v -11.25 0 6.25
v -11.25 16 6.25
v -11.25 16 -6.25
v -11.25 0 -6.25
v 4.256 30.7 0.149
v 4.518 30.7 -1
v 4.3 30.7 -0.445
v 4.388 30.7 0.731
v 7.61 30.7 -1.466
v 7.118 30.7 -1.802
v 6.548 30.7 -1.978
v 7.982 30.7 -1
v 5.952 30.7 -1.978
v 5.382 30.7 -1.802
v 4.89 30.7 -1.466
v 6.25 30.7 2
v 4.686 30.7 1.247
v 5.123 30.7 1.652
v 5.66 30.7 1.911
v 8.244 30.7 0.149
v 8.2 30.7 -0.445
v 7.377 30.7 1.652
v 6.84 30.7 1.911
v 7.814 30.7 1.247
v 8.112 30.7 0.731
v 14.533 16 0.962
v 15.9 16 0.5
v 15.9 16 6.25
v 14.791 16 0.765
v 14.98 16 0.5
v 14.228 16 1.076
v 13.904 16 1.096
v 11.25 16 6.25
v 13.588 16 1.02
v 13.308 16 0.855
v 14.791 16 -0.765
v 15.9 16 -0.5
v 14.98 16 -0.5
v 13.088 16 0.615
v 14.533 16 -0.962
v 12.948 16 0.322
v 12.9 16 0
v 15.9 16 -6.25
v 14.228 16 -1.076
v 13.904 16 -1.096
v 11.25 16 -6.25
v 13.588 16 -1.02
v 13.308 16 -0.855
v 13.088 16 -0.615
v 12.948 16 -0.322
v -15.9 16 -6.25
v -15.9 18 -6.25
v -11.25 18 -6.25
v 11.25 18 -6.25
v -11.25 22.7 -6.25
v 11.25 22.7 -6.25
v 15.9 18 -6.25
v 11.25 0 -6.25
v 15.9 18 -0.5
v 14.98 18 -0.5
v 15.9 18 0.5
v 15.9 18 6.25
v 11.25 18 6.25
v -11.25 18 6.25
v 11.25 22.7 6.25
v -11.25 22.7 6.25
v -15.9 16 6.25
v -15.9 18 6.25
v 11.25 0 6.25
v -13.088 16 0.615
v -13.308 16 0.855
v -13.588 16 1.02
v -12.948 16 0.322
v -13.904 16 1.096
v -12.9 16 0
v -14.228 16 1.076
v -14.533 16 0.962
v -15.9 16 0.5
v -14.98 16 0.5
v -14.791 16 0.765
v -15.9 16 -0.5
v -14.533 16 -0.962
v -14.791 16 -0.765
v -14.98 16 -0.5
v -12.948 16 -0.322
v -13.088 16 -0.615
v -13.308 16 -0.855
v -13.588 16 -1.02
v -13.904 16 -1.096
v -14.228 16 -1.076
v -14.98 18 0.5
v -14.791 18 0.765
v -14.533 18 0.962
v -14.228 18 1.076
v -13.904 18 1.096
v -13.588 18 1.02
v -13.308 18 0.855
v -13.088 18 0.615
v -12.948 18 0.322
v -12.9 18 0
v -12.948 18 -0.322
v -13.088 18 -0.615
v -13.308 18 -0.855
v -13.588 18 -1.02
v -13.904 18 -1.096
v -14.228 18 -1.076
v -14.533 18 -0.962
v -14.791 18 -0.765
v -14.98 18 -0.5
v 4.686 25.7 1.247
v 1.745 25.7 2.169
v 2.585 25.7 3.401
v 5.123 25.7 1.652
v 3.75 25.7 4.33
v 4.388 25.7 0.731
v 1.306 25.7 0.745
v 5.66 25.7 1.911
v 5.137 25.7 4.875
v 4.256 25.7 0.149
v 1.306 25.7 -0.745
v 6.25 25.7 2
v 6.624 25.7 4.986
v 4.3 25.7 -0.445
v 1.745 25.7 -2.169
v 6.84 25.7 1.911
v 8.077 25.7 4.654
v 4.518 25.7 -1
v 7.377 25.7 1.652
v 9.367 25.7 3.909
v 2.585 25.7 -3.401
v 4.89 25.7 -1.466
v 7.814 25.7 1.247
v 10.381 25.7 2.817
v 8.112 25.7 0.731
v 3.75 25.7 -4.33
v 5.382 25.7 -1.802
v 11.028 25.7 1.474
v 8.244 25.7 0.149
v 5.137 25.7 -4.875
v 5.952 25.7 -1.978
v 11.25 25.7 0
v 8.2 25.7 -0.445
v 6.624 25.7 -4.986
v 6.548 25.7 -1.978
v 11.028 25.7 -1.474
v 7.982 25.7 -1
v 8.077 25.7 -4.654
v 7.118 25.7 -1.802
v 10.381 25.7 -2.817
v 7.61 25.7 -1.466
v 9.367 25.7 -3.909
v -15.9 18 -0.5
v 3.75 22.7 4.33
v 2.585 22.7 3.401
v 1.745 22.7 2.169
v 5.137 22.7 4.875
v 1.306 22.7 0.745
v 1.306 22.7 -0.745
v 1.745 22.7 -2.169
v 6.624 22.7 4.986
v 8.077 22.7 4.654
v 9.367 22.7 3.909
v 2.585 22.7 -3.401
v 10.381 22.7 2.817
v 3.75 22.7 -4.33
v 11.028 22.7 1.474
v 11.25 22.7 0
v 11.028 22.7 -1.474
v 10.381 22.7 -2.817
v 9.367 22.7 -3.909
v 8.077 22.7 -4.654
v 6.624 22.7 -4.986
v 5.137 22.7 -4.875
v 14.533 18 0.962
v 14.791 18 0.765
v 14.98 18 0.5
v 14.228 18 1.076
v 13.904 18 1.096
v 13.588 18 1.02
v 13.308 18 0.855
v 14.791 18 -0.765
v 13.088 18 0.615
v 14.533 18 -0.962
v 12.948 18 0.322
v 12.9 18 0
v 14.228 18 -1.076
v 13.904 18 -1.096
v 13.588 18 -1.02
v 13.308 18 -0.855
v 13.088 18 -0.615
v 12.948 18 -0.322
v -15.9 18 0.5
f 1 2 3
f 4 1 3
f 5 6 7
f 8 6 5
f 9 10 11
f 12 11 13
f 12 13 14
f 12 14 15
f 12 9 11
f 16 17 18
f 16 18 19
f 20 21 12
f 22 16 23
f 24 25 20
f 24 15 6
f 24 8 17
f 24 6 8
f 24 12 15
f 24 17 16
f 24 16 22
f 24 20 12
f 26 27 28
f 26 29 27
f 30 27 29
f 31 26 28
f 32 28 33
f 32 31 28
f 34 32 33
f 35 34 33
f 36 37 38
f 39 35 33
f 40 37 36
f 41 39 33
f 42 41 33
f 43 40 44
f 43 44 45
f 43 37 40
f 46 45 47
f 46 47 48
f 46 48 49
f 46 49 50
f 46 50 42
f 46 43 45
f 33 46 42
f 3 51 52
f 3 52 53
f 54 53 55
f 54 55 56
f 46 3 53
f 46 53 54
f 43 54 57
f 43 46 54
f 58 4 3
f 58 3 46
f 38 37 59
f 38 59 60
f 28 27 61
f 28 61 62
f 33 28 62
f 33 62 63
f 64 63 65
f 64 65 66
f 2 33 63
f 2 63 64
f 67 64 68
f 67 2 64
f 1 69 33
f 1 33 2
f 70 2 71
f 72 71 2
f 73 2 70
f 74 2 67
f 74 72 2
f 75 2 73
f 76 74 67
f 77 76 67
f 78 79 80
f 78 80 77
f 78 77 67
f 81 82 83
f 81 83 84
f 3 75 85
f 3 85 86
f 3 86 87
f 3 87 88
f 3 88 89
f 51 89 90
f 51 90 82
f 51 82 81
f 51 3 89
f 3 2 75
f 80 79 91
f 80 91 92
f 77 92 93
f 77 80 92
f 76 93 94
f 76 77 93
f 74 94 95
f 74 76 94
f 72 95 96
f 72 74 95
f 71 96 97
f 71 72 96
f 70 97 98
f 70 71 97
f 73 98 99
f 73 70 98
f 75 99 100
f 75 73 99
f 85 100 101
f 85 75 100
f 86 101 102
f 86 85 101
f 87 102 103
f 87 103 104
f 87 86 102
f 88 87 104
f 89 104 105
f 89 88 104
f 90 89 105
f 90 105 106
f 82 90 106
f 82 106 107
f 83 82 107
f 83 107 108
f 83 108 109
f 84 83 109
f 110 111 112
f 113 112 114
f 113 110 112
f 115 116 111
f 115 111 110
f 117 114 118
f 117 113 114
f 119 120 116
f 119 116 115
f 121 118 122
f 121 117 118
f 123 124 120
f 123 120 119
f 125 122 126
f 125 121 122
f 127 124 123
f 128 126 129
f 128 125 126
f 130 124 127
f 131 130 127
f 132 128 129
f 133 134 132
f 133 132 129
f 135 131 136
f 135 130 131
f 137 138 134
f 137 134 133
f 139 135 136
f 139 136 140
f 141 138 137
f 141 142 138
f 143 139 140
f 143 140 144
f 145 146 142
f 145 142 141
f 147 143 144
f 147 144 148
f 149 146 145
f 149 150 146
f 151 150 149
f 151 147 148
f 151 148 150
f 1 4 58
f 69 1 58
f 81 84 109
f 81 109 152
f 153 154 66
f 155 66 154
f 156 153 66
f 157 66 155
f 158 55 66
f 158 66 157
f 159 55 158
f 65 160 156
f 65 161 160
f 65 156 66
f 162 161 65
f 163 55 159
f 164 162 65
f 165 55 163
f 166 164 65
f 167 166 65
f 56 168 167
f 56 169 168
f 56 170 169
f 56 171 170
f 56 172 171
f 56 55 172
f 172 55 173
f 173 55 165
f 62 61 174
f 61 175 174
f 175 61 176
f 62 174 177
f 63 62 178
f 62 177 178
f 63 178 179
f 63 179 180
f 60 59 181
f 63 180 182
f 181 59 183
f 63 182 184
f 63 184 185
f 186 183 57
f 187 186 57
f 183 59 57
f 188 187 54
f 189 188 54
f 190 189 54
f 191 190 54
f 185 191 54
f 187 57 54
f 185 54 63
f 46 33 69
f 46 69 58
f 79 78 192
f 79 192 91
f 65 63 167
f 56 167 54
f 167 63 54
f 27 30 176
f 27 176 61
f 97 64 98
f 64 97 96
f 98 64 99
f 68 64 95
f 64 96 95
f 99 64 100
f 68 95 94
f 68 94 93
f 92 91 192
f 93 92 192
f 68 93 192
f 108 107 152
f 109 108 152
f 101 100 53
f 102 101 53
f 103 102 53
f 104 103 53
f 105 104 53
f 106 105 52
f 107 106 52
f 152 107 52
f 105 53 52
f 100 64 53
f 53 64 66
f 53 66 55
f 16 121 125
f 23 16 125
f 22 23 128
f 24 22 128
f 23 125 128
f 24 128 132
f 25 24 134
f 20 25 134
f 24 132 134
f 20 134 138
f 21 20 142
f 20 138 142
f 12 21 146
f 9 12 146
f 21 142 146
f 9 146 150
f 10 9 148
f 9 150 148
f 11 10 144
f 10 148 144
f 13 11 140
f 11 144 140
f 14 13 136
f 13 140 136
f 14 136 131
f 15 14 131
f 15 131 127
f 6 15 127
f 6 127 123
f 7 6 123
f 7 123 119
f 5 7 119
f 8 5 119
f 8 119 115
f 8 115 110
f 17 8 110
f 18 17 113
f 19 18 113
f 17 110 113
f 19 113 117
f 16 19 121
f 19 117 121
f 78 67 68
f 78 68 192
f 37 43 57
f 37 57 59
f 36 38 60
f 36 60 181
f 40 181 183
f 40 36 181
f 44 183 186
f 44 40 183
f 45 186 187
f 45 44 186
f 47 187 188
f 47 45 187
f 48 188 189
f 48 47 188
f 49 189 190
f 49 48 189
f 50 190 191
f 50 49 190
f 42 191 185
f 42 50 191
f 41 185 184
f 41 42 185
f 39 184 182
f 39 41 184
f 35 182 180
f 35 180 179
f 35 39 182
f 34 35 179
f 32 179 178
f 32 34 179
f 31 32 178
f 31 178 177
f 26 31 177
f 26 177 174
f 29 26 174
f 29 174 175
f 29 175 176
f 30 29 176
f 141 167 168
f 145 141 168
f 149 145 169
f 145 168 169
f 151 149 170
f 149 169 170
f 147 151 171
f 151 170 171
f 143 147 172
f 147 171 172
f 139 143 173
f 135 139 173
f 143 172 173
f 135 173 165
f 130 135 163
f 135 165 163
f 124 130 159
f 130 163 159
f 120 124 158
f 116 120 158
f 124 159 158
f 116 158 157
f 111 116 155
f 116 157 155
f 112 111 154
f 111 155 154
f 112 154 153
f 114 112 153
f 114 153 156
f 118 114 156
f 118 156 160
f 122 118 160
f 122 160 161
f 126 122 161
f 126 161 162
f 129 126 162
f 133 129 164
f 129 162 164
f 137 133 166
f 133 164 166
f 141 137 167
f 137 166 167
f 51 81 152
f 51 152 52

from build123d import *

# Parameters (mm, degrees)
SKETCH_1_W      = 22.5
SKETCH_1_H      = 12.5
EXTRUDE_1_DEPTH = 16
EXTRUDE_2_DEPTH = 2
SKETCH_3_W      = 22.5
SKETCH_3_H      = 12.5
EXTRUDE_3_DEPTH = 4.7
SKETCH_4_R      = 5
EXTRUDE_4_DEPTH = 3
SKETCH_5_R      = 2
EXTRUDE_5_DEPTH = 5


with BuildPart() as part:
    # 草图1 → 凸台-拉伸1 (new body)
    with BuildSketch(Plane(origin=(0, 0, 0), x_dir=(1, 0, 0), z_dir=(0, 1, 0))):
        Rectangle(SKETCH_1_W, SKETCH_1_H)
    extrude(amount=EXTRUDE_1_DEPTH)

    # 草图2 → 凸台-拉伸2 (add)
    with BuildSketch(Plane(origin=(0, 16, 0), x_dir=(1, 0, 0), z_dir=(0, 1, 0))):
        with BuildLine():
            Line((-15.9, 6.25), (15.9, 6.25))
            Line((15.9, 6.25), (15.9, 0.5))
            Line((15.9, 0.5), (14.979795897, 0.5))
            ThreePointArc((14.979795897, 0.5), (12.9, 0), (14.979795897, -0.5))
            Line((14.979795897, -0.5), (15.9, -0.5))
            Line((15.9, -0.5), (15.9, -6.25))
            Line((15.9, -6.25), (-15.9, -6.25))
            Line((-15.9, -6.25), (-15.9, -0.5))
            Line((-15.9, -0.5), (-14.979795897, -0.5))
            ThreePointArc((-14.979795897, -0.5), (-12.9, 0), (-14.979795897, 0.5))
            Line((-14.979795897, 0.5), (-15.9, 0.5))
            Line((-15.9, 0.5), (-15.9, 6.25))
        make_face()
    extrude(amount=EXTRUDE_2_DEPTH)

    # 草图3 → 凸台-拉伸3 (add)
    with BuildSketch(Plane(origin=(0, 18, 0), x_dir=(1, 0, 0), z_dir=(0, 1, 0))):
        Rectangle(SKETCH_3_W, SKETCH_3_H)
    extrude(amount=EXTRUDE_3_DEPTH)

    # 草图4 → 凸台-拉伸4 (add)
    with BuildSketch(Plane(origin=(0, 22.7, 0), x_dir=(1, 0, 0), z_dir=(0, 1, 0))):
        with Locations((6.25, 0)):
            Circle(SKETCH_4_R)
    extrude(amount=EXTRUDE_4_DEPTH)

    # 草图5 → 凸台-拉伸5 (add)
    with BuildSketch(Plane(origin=(0, 25.7, 0), x_dir=(1, 0, 0), z_dir=(0, 1, 0))):
        with Locations(Location((6.25, 0, 0), (0, 0, 270))):
            Circle(SKETCH_5_R)
    extrude(amount=EXTRUDE_5_DEPTH)


solid = part.part
